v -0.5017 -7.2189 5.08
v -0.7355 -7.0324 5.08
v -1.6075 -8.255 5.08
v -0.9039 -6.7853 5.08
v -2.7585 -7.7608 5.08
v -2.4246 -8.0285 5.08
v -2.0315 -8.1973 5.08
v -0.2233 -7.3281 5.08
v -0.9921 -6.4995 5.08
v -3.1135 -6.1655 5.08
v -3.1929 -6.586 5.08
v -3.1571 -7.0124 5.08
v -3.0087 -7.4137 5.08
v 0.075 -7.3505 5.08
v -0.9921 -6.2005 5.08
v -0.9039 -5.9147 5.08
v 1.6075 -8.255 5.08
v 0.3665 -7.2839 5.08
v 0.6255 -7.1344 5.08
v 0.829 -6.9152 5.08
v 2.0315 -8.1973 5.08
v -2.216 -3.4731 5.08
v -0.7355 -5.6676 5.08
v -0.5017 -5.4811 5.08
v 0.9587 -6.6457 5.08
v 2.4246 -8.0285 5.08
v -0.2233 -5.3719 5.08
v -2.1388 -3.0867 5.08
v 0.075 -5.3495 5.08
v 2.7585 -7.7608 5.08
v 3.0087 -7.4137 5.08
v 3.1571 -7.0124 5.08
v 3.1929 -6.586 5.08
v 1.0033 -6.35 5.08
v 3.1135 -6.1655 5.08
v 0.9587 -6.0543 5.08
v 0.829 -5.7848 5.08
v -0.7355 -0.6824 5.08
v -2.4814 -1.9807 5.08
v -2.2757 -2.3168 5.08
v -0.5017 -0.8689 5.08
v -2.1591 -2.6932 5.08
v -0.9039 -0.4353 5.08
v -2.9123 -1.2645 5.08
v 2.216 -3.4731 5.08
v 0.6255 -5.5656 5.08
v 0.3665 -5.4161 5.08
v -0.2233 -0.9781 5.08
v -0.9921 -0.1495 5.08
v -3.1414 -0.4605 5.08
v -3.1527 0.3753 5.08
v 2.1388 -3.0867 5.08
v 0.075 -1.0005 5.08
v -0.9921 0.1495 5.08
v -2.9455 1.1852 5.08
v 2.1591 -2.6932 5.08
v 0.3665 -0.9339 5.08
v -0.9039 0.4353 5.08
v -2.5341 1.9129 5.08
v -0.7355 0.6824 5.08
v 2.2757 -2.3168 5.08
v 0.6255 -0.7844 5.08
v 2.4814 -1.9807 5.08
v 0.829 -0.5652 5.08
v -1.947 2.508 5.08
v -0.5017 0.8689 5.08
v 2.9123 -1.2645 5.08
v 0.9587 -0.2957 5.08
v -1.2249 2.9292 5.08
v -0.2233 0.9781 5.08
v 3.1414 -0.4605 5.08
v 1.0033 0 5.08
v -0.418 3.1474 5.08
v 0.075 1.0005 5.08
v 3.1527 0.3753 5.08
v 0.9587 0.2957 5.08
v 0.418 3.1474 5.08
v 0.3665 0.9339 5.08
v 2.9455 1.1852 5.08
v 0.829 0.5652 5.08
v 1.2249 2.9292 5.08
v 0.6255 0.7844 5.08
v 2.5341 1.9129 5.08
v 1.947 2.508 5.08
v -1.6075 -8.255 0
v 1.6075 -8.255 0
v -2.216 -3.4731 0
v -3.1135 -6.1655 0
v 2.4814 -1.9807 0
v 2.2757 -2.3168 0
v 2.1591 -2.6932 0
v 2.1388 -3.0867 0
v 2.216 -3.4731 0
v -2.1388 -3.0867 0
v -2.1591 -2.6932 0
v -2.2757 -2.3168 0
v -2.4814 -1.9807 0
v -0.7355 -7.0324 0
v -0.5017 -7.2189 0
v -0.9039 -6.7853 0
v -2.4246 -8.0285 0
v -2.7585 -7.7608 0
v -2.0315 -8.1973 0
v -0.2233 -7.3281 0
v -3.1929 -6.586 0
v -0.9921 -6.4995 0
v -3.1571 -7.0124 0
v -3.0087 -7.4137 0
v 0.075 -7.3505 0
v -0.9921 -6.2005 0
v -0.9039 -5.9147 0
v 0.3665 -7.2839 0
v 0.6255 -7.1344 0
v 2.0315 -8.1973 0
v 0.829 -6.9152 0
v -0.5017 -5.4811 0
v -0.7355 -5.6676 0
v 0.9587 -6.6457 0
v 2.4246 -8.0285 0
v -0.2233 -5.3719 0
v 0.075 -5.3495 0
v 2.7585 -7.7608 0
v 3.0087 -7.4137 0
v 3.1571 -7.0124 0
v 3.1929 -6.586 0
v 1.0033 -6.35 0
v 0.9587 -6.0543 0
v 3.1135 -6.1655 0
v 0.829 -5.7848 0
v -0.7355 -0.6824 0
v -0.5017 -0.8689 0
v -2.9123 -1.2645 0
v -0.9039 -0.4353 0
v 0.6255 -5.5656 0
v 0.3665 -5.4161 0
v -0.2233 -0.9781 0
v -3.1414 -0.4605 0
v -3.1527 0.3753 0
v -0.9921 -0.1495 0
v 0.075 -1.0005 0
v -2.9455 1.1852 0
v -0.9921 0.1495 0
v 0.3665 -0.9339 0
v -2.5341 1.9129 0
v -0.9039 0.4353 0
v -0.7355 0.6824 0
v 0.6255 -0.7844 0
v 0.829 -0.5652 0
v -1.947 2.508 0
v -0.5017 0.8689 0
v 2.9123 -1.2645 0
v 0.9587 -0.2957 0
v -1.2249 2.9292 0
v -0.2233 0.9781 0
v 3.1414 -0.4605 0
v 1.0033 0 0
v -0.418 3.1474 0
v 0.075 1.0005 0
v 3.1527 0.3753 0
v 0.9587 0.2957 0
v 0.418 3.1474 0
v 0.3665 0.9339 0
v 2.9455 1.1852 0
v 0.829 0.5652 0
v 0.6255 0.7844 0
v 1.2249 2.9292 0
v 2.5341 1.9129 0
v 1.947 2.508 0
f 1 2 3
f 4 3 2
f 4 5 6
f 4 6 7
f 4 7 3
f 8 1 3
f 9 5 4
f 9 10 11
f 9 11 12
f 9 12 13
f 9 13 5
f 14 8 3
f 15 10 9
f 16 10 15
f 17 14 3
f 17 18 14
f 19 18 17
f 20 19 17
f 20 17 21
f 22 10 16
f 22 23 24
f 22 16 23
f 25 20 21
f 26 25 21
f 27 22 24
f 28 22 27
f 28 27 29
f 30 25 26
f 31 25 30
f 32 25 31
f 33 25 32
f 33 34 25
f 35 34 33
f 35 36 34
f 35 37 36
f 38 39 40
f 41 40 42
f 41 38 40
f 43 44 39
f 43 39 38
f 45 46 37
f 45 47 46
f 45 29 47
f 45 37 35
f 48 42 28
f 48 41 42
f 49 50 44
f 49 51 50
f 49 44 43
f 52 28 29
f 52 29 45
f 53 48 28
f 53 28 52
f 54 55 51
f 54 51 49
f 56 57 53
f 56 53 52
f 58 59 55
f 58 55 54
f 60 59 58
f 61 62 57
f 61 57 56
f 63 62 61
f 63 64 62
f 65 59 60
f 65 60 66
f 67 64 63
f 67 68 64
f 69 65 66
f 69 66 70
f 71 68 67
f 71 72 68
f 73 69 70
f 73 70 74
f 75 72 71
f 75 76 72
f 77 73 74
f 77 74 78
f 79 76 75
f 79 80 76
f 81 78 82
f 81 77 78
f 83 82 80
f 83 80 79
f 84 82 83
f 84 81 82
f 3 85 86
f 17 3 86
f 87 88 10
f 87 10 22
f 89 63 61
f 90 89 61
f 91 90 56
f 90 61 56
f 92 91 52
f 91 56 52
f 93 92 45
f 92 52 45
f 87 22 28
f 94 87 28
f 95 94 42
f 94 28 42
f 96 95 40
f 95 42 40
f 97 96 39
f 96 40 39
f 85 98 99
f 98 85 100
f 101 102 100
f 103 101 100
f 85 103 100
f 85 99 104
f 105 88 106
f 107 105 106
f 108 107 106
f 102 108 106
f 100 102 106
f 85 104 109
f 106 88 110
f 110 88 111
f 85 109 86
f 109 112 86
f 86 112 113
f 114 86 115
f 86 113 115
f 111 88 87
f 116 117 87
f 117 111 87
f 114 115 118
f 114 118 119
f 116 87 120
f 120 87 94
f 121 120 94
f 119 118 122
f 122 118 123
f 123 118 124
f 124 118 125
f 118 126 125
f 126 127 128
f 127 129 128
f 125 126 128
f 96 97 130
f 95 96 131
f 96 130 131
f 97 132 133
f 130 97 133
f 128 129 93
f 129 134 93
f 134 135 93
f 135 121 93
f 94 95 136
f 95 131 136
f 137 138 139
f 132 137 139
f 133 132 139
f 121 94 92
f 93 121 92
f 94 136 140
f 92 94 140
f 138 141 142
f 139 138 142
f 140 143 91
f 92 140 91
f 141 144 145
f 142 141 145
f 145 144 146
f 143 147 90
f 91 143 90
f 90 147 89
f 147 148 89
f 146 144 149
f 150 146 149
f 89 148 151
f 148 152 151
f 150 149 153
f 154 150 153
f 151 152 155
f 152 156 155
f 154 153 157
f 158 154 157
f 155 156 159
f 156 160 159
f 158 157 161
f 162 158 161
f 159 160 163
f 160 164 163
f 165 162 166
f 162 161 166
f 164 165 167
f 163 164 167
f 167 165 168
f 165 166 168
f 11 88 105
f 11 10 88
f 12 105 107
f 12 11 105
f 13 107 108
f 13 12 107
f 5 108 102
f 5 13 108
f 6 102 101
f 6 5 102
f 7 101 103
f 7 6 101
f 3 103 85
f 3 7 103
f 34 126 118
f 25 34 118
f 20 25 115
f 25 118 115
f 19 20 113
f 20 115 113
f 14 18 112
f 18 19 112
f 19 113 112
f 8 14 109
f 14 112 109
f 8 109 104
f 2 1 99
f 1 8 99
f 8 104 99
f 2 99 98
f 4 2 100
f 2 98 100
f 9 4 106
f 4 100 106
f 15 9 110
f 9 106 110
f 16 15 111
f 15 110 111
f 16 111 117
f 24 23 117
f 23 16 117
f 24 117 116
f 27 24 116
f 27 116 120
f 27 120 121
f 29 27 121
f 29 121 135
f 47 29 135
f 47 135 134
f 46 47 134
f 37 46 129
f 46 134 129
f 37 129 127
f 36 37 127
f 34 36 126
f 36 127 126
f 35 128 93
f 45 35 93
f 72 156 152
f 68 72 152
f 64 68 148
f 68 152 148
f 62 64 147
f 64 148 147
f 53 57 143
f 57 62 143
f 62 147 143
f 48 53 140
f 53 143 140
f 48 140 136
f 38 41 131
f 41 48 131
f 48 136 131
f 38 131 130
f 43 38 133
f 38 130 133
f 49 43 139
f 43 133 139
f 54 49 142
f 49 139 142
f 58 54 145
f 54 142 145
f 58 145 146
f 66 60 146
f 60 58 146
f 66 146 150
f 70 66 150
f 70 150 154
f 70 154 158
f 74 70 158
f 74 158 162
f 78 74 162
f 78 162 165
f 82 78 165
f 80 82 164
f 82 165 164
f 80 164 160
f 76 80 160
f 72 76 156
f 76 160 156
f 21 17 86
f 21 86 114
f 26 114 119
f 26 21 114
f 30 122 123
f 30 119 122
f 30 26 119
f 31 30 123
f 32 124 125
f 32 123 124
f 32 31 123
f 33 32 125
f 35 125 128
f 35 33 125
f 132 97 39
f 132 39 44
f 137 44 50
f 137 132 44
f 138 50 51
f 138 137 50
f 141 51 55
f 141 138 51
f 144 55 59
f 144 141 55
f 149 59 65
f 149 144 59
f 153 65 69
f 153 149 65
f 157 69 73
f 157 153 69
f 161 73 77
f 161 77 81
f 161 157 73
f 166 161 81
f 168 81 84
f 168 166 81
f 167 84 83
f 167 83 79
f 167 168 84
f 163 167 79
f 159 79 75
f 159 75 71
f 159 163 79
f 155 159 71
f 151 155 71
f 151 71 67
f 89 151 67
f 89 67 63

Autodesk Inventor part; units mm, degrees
ref_plane "YZ Plane" through (0, 0, 0) normal (1, 0, 0) x (0, 1, 0)
ref_plane "XZ Plane" through (0, 0, 0) normal (0, 1, 0) x (-1, 0, 0)
ref_plane "XY Plane" through (0, 0, 0) normal (0, 0, 1) x (1, 0, 0)
sketch "Sketch1" plane through (0, 0, 0) normal (0, 0, 1) x (1, 0, 0)
  circle A0 centre (0, 0) radius 1.0033
  circle A1 centre (0, 0) radius 3.175
  line L0 (-1.905, -8.255) -> (1.905, -8.255)
  line L1 (1.905, -8.255) -> (1.905, -2.54)
  line L2 (-1.905, -8.255) -> (-1.905, -2.54)
  circle A2 centre (0, -6.35) radius 1.0033
  line L3 (1.905, -8.255) -> (3.81, -8.255)
  line L4 (3.81, -8.255) -> (1.905, -2.54)
  line L5 (-1.905, -8.255) -> (-3.81, -8.255)
  line L6 (-3.81, -8.255) -> (-1.905, -2.54)
  point P0 (0, -8.255)
  dimension "d0" = 2.0066
  dimension "d1" = 6.35
  dimension "d2" = 3.81
  dimension "d3" = 2.0066
  dimension "d4" = 5.715
  dimension "d5" = 1.905
  dimension "d10" = 1.905
  dimension "d11" = 1.905
extrude "Extrusion1" add sketch "Sketch1" along normal blind 5.08 contours A1 | A1 L1 L0 L2
extrude "Extrusion3" add sketch "Sketch1" along normal blind 5.08 contours L2 L5 L6 | L4 L3 L1
fillet "Fillet1" radius 1.5875 4 edges at (3.81, -8.255, 2.54) (-3.81, -8.255, 2.54) (1.905, -2.54, 2.54) (-1.905, -2.54, 2.54)
